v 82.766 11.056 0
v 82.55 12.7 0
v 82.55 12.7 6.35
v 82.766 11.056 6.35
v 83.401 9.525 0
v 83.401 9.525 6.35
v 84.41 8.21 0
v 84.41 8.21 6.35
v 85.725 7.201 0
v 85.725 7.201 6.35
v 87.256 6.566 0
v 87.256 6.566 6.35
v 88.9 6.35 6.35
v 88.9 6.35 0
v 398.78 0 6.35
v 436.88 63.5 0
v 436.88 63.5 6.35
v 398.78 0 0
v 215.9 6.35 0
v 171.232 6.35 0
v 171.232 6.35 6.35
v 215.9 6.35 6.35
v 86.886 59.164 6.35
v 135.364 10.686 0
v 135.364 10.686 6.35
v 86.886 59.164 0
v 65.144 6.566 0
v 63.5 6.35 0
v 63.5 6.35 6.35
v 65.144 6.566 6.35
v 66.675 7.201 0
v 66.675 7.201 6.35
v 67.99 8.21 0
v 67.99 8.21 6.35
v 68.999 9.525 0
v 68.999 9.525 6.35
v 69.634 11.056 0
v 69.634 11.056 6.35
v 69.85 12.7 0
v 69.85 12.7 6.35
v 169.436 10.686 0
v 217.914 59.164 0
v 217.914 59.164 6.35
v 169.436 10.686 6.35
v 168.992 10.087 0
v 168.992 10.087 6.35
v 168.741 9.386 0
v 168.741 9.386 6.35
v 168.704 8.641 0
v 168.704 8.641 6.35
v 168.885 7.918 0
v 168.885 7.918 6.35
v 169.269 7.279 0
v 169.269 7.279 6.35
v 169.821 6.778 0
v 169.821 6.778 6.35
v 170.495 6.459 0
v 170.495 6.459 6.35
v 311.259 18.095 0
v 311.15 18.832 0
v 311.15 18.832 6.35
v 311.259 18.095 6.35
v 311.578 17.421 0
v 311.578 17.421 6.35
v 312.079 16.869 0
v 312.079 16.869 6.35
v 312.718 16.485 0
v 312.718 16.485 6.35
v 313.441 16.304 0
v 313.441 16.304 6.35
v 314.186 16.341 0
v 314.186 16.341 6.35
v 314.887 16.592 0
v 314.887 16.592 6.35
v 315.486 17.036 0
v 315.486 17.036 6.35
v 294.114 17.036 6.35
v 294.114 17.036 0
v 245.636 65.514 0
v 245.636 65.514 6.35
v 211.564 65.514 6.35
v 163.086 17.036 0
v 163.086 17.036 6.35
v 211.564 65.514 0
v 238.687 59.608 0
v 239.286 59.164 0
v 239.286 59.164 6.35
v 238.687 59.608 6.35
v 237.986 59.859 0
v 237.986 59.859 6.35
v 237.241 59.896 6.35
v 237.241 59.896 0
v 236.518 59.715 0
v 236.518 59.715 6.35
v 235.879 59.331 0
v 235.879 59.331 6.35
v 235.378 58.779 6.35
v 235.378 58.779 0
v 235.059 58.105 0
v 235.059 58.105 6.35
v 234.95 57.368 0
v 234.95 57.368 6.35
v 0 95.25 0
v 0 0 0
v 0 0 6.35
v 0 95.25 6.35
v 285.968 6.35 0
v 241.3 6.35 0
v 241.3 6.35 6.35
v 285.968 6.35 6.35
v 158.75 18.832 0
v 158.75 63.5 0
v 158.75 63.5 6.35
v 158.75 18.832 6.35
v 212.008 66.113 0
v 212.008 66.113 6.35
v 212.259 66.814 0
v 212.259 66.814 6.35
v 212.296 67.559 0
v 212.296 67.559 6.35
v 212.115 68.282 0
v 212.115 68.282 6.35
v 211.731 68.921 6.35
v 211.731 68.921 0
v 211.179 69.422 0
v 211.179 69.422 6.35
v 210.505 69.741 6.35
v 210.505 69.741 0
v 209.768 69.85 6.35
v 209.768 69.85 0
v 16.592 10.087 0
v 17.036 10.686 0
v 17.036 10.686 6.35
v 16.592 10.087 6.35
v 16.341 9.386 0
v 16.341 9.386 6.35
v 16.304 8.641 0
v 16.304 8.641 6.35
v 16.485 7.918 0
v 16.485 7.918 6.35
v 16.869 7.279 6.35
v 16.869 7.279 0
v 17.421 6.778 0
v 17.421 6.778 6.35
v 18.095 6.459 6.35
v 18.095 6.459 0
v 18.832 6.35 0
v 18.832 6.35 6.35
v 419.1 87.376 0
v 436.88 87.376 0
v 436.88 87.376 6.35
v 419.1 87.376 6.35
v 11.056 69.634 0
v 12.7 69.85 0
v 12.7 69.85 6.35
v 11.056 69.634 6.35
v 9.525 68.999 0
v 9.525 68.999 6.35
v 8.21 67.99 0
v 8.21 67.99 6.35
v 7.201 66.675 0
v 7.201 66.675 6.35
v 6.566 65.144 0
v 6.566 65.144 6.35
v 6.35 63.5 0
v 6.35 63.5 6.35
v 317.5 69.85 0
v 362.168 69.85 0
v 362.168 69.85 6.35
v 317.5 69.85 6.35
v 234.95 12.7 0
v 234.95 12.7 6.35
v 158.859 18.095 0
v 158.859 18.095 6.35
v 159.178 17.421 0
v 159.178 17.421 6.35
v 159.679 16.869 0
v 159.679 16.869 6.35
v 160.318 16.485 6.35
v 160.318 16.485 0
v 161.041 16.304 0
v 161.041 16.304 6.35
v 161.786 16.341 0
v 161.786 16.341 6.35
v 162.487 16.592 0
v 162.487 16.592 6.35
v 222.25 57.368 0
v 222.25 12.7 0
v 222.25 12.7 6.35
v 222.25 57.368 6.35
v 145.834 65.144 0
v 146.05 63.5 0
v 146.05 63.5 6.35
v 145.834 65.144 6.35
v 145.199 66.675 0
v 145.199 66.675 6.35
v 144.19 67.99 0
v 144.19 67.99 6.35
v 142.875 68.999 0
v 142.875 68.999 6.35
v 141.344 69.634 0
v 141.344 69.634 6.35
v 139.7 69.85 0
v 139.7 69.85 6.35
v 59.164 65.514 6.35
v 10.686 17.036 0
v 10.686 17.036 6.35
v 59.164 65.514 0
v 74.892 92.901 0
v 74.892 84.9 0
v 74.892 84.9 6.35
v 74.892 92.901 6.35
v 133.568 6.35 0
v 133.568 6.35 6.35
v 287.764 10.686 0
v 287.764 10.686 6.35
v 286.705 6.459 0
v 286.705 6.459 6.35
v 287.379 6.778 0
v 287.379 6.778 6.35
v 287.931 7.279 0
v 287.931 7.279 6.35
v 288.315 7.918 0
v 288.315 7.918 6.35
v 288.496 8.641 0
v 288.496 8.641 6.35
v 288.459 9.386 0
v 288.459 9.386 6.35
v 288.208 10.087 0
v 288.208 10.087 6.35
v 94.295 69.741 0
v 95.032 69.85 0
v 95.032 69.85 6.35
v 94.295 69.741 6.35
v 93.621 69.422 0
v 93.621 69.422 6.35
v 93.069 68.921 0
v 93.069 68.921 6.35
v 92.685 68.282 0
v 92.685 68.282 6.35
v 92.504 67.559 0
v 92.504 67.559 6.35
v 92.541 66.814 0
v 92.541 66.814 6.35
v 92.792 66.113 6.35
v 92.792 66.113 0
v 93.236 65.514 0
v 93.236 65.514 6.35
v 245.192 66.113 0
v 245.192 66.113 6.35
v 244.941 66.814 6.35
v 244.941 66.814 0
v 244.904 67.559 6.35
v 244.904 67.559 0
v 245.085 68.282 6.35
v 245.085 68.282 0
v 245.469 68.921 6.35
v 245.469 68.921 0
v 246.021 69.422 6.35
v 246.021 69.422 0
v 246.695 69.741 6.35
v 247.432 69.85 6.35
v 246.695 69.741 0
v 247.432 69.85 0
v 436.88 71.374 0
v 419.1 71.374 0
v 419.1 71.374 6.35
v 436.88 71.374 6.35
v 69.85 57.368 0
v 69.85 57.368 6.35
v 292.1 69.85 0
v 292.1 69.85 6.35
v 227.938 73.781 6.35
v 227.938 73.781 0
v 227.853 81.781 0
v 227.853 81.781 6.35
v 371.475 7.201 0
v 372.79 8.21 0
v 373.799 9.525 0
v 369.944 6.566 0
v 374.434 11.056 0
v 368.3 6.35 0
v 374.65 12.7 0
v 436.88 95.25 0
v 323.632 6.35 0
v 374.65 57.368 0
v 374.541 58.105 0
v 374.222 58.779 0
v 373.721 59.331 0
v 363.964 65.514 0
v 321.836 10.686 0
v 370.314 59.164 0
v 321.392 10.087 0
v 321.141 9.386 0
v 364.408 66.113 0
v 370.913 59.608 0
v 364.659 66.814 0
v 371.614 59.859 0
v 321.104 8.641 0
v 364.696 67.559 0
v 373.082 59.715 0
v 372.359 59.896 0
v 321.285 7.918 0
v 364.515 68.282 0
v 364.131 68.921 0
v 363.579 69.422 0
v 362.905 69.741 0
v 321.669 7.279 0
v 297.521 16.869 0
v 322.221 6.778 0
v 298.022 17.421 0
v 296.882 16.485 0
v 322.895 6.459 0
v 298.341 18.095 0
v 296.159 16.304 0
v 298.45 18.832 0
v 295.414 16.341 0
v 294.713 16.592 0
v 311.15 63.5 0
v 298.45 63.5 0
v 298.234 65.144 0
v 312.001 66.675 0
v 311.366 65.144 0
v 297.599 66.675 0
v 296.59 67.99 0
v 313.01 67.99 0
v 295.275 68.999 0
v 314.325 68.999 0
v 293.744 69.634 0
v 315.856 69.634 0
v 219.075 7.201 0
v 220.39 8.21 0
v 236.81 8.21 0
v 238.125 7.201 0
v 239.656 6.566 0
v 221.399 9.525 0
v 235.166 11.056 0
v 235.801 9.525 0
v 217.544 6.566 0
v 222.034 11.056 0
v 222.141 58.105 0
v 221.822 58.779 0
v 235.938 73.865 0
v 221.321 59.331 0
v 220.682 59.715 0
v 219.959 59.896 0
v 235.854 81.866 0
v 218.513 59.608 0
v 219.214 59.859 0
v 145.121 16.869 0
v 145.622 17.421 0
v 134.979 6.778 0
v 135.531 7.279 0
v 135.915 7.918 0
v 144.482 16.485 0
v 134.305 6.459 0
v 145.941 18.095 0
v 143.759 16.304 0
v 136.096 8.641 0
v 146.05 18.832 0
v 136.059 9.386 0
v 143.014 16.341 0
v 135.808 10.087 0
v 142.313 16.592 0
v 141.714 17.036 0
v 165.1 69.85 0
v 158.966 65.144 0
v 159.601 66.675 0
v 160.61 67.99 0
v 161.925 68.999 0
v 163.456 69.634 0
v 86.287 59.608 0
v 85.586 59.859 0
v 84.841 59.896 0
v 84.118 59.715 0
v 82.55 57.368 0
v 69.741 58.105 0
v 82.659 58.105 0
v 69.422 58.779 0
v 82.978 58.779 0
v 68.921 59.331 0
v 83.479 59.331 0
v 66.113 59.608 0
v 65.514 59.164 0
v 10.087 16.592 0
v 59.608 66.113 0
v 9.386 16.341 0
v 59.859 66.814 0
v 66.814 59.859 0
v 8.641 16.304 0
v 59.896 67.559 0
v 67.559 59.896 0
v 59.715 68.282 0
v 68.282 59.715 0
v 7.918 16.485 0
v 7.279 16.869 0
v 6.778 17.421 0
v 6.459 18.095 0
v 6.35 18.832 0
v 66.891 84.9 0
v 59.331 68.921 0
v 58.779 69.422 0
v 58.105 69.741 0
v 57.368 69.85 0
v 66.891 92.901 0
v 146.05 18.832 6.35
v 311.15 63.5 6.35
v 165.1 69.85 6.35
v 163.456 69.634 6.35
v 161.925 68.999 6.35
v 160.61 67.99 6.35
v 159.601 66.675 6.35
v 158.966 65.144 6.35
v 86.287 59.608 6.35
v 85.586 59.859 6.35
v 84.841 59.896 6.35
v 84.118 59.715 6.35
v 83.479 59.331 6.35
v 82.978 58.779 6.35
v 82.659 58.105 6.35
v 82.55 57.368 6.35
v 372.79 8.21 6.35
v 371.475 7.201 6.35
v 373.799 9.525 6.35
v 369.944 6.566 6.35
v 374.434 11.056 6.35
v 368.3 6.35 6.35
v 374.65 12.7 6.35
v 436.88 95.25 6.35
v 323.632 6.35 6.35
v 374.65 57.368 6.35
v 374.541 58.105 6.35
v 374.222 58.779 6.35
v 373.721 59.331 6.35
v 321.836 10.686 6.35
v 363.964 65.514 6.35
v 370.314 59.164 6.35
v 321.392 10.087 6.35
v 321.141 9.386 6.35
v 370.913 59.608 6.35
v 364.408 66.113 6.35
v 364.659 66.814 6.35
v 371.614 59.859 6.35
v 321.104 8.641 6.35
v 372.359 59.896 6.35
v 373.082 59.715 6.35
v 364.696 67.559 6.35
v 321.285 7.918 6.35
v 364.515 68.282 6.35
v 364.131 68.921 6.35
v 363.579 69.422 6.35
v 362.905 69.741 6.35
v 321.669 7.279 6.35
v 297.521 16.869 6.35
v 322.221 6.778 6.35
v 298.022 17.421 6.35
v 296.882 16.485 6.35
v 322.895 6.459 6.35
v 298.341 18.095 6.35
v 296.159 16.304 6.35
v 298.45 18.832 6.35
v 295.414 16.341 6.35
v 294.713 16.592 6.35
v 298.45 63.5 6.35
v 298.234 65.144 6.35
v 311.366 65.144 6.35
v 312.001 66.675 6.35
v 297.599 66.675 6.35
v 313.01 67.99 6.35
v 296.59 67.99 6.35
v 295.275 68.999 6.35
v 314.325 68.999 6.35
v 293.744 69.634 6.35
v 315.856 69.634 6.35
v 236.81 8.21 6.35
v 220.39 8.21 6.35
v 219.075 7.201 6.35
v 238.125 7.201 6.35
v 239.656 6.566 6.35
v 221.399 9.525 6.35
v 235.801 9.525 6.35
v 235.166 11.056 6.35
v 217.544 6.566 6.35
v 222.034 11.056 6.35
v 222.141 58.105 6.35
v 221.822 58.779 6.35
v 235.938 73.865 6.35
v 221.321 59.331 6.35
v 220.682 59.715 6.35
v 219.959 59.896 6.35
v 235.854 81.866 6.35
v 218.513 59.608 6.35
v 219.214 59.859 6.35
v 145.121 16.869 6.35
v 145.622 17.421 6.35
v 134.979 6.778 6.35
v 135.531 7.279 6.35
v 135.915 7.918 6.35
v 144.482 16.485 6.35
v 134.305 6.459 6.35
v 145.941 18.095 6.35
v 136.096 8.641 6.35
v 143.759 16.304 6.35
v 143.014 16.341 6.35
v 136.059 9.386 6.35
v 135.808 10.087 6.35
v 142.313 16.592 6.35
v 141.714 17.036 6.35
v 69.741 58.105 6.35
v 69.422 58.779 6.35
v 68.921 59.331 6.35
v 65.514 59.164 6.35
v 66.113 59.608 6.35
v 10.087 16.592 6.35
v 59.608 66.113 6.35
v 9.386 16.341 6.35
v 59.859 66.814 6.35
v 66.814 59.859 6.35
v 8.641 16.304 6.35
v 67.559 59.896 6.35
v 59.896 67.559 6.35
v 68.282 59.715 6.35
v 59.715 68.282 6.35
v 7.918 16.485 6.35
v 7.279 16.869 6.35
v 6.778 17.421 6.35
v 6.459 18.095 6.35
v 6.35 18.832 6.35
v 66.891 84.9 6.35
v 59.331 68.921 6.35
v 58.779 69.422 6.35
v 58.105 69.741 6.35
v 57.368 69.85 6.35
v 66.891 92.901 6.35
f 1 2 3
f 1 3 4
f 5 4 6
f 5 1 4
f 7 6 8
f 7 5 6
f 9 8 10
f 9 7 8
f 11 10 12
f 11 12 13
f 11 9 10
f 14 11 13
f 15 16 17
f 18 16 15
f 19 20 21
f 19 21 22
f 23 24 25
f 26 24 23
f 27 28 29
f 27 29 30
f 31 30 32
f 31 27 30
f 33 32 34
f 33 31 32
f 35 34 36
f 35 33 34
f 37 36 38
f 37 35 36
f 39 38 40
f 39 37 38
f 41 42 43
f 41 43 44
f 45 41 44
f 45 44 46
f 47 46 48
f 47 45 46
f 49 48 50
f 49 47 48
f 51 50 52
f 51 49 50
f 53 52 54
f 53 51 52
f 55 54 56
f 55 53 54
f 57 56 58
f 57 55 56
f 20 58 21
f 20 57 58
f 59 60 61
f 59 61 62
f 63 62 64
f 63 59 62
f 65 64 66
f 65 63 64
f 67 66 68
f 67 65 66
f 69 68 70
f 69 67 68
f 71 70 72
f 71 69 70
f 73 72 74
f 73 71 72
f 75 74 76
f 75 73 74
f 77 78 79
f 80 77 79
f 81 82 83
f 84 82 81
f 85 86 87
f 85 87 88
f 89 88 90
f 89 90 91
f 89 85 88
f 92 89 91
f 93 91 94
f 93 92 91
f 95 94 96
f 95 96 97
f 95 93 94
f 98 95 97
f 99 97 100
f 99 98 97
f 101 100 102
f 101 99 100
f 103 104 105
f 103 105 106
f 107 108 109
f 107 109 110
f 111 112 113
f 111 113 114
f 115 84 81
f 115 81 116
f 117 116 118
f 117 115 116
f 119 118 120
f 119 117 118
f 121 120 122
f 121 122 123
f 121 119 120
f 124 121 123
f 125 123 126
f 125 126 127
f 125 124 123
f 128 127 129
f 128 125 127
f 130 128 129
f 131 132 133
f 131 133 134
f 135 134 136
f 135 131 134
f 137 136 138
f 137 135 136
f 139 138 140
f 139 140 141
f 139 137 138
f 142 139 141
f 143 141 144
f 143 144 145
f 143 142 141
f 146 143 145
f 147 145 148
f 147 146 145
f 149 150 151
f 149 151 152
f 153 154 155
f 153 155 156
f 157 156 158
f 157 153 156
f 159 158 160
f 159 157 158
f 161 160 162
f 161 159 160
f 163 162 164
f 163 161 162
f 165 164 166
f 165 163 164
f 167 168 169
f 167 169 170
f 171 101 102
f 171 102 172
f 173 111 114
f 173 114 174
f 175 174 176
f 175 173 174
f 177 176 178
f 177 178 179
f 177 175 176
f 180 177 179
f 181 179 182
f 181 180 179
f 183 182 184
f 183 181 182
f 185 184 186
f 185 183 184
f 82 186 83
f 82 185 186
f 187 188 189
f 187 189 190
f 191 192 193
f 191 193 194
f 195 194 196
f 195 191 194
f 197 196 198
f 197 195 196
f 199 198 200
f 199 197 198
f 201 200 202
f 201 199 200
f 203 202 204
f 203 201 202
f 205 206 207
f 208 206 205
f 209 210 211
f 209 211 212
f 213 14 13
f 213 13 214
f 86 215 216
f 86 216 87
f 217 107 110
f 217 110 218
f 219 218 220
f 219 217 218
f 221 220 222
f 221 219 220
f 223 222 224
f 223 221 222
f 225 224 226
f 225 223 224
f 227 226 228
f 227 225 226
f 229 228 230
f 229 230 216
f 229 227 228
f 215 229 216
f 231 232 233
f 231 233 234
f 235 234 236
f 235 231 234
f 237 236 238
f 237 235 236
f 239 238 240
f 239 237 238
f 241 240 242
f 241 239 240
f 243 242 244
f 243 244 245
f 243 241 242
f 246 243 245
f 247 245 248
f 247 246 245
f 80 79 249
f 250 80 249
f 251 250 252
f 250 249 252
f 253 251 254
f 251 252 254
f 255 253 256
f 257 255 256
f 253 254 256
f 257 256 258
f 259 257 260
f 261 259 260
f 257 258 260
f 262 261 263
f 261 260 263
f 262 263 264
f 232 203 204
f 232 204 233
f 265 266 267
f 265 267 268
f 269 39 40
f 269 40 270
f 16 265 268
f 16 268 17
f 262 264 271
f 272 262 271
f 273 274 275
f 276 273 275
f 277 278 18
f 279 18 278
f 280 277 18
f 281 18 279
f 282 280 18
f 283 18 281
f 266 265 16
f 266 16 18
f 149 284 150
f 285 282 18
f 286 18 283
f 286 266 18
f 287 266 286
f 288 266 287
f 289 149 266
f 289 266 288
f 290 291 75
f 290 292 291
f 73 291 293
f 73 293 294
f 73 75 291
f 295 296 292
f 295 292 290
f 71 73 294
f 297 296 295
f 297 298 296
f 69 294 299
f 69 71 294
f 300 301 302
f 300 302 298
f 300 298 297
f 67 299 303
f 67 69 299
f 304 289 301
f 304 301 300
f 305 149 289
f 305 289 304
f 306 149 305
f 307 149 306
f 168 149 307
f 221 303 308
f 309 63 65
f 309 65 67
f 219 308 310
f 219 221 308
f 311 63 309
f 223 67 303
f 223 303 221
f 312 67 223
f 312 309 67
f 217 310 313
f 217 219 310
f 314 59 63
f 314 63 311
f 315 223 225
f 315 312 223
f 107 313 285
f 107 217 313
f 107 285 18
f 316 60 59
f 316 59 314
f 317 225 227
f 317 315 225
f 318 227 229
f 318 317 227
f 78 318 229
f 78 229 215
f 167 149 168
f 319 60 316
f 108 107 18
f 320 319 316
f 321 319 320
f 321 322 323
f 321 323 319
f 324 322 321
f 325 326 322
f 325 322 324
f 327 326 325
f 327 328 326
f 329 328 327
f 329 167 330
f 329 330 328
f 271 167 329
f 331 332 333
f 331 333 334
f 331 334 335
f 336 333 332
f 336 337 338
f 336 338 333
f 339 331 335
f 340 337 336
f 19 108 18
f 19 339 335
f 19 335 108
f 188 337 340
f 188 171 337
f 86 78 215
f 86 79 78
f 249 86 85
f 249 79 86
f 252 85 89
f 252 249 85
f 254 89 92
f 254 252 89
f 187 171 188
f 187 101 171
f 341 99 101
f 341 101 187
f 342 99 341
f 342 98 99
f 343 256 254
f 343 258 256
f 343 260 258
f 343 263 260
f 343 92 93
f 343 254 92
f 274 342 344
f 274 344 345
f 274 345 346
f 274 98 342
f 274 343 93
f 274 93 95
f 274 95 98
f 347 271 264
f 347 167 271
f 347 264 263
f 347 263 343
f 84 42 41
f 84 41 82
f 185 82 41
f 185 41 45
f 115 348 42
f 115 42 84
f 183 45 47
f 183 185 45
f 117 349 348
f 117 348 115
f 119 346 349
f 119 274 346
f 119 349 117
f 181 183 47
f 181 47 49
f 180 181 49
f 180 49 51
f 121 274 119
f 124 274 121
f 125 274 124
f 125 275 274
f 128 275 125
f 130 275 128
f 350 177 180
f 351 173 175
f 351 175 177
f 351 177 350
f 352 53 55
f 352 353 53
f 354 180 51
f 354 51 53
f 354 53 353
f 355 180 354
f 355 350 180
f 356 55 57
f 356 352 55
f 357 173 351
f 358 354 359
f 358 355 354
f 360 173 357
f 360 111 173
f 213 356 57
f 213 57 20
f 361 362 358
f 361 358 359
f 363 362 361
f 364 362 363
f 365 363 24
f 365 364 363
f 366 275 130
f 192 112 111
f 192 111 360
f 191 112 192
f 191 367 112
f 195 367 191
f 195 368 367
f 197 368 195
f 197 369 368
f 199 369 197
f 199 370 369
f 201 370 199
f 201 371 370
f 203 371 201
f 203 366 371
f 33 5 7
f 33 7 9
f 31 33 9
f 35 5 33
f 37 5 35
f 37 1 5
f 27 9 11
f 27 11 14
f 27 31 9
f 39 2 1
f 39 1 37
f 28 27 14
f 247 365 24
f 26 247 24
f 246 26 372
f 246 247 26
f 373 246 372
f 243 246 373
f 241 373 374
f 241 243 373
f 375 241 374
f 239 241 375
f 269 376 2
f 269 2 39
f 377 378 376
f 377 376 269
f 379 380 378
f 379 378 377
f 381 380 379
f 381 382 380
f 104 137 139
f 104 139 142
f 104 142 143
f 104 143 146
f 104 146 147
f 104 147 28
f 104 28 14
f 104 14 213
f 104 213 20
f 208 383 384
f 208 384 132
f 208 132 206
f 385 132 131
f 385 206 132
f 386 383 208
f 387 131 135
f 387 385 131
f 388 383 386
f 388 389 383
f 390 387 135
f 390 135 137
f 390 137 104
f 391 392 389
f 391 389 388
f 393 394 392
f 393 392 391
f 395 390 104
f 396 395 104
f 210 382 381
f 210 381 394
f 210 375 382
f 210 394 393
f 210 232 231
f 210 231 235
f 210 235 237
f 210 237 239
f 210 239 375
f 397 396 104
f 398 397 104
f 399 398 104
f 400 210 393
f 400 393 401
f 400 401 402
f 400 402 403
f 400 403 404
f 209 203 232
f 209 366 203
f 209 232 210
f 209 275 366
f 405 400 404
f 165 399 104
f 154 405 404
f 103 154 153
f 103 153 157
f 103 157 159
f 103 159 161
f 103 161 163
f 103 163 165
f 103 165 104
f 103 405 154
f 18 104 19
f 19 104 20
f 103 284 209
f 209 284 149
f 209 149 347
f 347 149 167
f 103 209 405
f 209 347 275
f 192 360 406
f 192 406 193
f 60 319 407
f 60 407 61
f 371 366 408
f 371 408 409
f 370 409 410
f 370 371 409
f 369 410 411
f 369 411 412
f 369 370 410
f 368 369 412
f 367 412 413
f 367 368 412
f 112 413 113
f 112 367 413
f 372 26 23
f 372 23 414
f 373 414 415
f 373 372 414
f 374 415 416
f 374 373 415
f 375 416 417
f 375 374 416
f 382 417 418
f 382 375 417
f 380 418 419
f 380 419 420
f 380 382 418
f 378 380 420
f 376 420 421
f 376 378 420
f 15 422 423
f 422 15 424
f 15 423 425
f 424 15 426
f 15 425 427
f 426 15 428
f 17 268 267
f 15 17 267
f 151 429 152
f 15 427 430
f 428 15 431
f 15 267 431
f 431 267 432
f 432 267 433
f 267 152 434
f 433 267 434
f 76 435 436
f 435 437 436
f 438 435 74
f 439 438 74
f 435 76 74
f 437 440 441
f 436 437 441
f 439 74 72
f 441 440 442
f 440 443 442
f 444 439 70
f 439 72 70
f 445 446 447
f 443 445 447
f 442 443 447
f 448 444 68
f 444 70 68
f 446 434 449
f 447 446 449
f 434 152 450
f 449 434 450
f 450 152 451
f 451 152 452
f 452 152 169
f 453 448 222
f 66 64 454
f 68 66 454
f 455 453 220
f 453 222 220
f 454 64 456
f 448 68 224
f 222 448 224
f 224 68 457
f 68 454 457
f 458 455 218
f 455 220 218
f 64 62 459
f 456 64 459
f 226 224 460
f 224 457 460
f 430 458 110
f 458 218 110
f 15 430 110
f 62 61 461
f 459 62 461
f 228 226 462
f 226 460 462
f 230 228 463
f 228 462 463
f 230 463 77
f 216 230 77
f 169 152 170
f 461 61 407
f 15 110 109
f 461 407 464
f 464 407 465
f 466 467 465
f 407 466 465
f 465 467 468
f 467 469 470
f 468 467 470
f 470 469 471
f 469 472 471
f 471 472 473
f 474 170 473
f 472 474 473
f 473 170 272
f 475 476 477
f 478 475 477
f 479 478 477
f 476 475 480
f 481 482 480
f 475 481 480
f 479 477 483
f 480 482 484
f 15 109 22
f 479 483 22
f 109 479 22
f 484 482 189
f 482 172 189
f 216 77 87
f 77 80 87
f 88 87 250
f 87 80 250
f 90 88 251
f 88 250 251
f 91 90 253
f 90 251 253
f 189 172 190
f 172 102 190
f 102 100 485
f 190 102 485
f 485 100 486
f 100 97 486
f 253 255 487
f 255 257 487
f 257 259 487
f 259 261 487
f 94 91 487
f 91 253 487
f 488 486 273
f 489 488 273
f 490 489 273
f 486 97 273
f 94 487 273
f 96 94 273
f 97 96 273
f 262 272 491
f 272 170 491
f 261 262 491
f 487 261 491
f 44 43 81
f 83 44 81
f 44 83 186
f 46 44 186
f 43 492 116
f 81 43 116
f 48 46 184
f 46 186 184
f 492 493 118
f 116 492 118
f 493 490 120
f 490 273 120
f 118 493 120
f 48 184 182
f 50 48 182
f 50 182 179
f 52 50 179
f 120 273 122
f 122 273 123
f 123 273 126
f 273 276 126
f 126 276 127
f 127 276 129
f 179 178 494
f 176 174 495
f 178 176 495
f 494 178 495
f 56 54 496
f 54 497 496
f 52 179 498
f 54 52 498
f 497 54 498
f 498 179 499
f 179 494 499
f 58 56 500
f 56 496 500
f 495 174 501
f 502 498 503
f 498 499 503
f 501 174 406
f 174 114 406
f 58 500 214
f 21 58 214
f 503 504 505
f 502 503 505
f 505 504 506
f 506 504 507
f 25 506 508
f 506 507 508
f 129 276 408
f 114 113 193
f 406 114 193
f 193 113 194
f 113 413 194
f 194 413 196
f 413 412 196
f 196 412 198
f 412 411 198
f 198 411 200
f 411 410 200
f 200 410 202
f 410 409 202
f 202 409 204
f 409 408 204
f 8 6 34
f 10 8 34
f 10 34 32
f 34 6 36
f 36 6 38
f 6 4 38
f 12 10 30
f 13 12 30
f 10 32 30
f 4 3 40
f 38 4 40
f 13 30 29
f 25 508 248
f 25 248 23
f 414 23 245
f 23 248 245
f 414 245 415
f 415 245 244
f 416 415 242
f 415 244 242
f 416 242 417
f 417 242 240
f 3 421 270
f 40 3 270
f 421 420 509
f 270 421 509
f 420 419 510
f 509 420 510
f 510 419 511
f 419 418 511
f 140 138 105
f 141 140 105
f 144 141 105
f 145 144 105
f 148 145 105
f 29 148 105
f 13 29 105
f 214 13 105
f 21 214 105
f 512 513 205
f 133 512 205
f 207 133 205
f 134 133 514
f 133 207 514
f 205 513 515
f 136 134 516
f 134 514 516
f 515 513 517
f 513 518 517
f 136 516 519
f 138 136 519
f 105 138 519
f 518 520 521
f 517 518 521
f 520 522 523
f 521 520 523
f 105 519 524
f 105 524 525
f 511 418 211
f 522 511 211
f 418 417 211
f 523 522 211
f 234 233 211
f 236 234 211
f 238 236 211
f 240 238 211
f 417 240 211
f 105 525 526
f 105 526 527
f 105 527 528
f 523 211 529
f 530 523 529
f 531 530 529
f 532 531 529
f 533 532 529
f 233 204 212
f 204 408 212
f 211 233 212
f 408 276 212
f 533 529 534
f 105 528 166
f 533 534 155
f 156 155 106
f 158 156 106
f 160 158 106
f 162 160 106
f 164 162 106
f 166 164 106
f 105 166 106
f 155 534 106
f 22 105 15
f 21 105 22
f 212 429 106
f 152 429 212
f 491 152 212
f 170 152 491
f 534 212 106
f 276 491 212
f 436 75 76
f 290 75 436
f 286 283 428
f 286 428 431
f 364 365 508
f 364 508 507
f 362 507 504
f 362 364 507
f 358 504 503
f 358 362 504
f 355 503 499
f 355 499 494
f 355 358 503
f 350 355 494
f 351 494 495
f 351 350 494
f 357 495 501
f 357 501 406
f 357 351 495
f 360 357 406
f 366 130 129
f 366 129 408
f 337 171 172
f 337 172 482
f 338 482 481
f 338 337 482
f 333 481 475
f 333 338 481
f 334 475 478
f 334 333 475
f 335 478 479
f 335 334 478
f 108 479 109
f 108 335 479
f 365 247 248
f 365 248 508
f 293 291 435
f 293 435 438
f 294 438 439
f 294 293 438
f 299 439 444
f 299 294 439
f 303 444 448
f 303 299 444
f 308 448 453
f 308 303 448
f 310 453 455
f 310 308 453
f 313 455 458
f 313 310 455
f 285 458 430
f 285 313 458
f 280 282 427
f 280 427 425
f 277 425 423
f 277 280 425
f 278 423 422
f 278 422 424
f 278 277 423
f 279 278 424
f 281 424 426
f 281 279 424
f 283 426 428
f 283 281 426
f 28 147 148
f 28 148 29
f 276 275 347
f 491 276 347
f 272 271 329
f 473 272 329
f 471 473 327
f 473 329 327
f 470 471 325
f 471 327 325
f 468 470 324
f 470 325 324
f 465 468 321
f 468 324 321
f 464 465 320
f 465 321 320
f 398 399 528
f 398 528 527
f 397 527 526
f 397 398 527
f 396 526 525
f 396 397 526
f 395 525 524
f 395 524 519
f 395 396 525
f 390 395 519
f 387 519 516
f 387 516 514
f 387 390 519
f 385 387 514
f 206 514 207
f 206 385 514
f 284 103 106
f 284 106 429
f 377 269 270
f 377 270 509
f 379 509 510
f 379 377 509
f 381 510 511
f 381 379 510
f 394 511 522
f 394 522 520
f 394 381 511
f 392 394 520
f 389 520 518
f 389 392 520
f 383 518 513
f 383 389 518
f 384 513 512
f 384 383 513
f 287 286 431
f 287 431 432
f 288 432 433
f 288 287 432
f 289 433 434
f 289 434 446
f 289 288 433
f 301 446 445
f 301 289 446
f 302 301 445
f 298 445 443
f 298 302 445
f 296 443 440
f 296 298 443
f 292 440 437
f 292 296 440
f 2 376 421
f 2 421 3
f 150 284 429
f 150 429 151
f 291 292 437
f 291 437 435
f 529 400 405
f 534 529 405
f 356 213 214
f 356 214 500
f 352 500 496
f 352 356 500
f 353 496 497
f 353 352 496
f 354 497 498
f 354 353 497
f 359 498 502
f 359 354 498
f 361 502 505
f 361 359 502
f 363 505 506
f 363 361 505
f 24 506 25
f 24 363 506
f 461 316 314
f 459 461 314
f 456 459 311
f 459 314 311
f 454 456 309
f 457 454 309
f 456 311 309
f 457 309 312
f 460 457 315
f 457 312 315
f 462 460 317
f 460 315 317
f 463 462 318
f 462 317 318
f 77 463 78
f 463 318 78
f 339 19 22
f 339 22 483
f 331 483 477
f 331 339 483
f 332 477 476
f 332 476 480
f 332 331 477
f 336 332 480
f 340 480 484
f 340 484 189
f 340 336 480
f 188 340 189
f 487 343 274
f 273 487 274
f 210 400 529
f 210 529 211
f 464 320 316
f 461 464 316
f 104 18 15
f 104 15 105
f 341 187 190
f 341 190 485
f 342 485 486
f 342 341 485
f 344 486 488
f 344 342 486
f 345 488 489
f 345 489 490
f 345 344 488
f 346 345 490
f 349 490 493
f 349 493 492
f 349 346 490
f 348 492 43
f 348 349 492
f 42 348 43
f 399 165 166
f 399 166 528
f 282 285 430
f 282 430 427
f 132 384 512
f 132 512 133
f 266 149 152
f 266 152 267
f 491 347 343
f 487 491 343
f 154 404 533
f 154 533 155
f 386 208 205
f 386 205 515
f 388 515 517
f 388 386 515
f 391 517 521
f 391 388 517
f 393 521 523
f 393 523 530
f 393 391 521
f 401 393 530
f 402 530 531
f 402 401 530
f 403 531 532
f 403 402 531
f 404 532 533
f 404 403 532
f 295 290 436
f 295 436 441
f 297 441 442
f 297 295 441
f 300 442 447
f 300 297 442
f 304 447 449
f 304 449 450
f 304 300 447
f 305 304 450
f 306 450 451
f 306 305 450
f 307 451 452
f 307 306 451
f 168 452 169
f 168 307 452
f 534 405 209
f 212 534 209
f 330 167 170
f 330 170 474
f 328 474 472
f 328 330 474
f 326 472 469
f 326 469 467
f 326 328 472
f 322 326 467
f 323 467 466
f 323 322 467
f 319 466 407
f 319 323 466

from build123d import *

# Parameters (mm, degrees)
MODEL_W             = 8.001
MODEL_H             = 8.001
BOSS_EXTRUDE2_DEPTH = 6.35


with BuildPart() as part:
    # Model → Boss-Extrude2 (new body)
    with BuildSketch(Plane.XY):
        Polygon((419.1, 87.376), (419.1, 71.374), (436.88, 71.374), (436.88, 63.5), (398.78, 0), (0, 0), (0, 95.25), (436.88, 95.25), (436.88, 87.376), align=None)
        with Locations((70.891200524, 88.9)):
            Rectangle(MODEL_W, MODEL_H, mode=Mode.SUBTRACT)
        Polygon((235.853706977, 81.865965064), (235.938184476, 73.865411048), (227.937630461, 73.780933549), (227.853152962, 81.781487564), align=None, mode=Mode.SUBTRACT)
        with BuildLine():
            Line((171.232102448, 6.35), (215.9, 6.35))
            ThreePointArc((215.9, 6.35), (220.390128061, 8.209871939), (222.25, 12.7))
            Line((222.25, 12.7), (222.25, 57.367897552))
            ThreePointArc((222.25, 57.367897552), (220.682015918, 59.714551565), (217.913948776, 59.163948776))
            Line((217.913948776, 59.163948776), (169.436051224, 10.686051224))
            ThreePointArc((169.436051224, 10.686051224), (168.885448435, 7.917984082), (171.232102448, 6.35))
        make_face(mode=Mode.SUBTRACT)
        with BuildLine():
            Line((234.95, 57.367897552), (234.95, 12.7))
            ThreePointArc((234.95, 12.7), (236.809871939, 8.209871939), (241.3, 6.35))
            Line((241.3, 6.35), (285.967897552, 6.35))
            ThreePointArc((285.967897552, 6.35), (288.314551565, 7.917984082), (287.763948776, 10.686051224))
            Line((287.763948776, 10.686051224), (239.286051224, 59.163948776))
            ThreePointArc((239.286051224, 59.163948776), (236.517984082, 59.714551565), (234.95, 57.367897552))
        make_face(mode=Mode.SUBTRACT)
        with BuildLine():
            Line((294.113948776, 17.036051224), (245.636051224, 65.513948776))
            ThreePointArc((245.636051224, 65.513948776), (245.085448435, 68.282015918), (247.432102448, 69.85))
            Line((247.432102448, 69.85), (292.1, 69.85))
            ThreePointArc((292.1, 69.85), (296.590128061, 67.990128061), (298.45, 63.5))
            Line((298.45, 63.5), (298.45, 18.832102448))
            ThreePointArc((298.45, 18.832102448), (296.882015918, 16.485448435), (294.113948776, 17.036051224))
        make_face(mode=Mode.SUBTRACT)
        with BuildLine():
            Line((323.632102448, 6.35), (368.3, 6.35))
            ThreePointArc((368.3, 6.35), (372.790128061, 8.209871939), (374.65, 12.7))
            Line((374.65, 12.7), (374.65, 57.367897552))
            ThreePointArc((374.65, 57.367897552), (373.082015918, 59.714551565), (370.313948776, 59.163948776))
            Line((370.313948776, 59.163948776), (321.836051224, 10.686051224))
            ThreePointArc((321.836051224, 10.686051224), (321.285448435, 7.917984082), (323.632102448, 6.35))
        make_face(mode=Mode.SUBTRACT)
        with BuildLine():
            Line((18.832102448, 6.35), (63.5, 6.35))
            ThreePointArc((63.5, 6.35), (67.990128061, 8.209871939), (69.85, 12.7))
            Line((69.85, 12.7), (69.85, 57.367897552))
            ThreePointArc((69.85, 57.367897552), (68.282015918, 59.714551565), (65.513948776, 59.163948776))
            Line((65.513948776, 59.163948776), (17.036051224, 10.686051224))
            ThreePointArc((17.036051224, 10.686051224), (16.485448435, 7.917984082), (18.832102448, 6.35))
        make_face(mode=Mode.SUBTRACT)
        with BuildLine():
            Line((82.55, 57.367897552), (82.55, 12.7))
            ThreePointArc((82.55, 12.7), (84.409871939, 8.209871939), (88.9, 6.35))
            Line((88.9, 6.35), (133.567897552, 6.35))
            ThreePointArc((133.567897552, 6.35), (135.914551565, 7.917984082), (135.363948776, 10.686051224))
            Line((135.363948776, 10.686051224), (86.886051224, 59.163948776))
            ThreePointArc((86.886051224, 59.163948776), (84.117984082, 59.714551565), (82.55, 57.367897552))
        make_face(mode=Mode.SUBTRACT)
        with BuildLine():
            Line((93.236051224, 65.513948776), (141.713948776, 17.036051224))
            ThreePointArc((141.713948776, 17.036051224), (144.482015918, 16.485448435), (146.05, 18.832102448))
            Line((146.05, 18.832102448), (146.05, 63.5))
            ThreePointArc((146.05, 63.5), (144.190128061, 67.990128061), (139.7, 69.85))
            Line((139.7, 69.85), (95.032102448, 69.85))
            ThreePointArc((95.032102448, 69.85), (92.685448435, 68.282015918), (93.236051224, 65.513948776))
        make_face(mode=Mode.SUBTRACT)
        with BuildLine():
            Line((163.086051224, 17.036051224), (211.563948776, 65.513948776))
            ThreePointArc((211.563948776, 65.513948776), (212.114551565, 68.282015918), (209.767897552, 69.85))
            Line((209.767897552, 69.85), (165.1, 69.85))
            ThreePointArc((165.1, 69.85), (160.609871939, 67.990128061), (158.75, 63.5))
            Line((158.75, 63.5), (158.75, 18.832102448))
            ThreePointArc((158.75, 18.832102448), (160.317984082, 16.485448435), (163.086051224, 17.036051224))
        make_face(mode=Mode.SUBTRACT)
        with BuildLine():
            Line((315.486051224, 17.036051224), (363.963948776, 65.513948776))
            ThreePointArc((363.963948776, 65.513948776), (364.514551565, 68.282015918), (362.167897552, 69.85))
            Line((362.167897552, 69.85), (317.5, 69.85))
            ThreePointArc((317.5, 69.85), (313.009871939, 67.990128061), (311.15, 63.5))
            Line((311.15, 63.5), (311.15, 18.832102448))
            ThreePointArc((311.15, 18.832102448), (312.717984082, 16.485448435), (315.486051224, 17.036051224))
        make_face(mode=Mode.SUBTRACT)
        with BuildLine():
            Line((6.35, 63.5), (6.35, 18.832102448))
            ThreePointArc((6.35, 18.832102448), (7.917984082, 16.485448435), (10.686051224, 17.036051224))
            Line((10.686051224, 17.036051224), (59.163948776, 65.513948776))
            ThreePointArc((59.163948776, 65.513948776), (59.714551565, 68.282015918), (57.367897552, 69.85))
            Line((57.367897552, 69.85), (12.7, 69.85))
            ThreePointArc((12.7, 69.85), (8.209871939, 67.990128061), (6.35, 63.5))
        make_face(mode=Mode.SUBTRACT)
    extrude(amount=BOSS_EXTRUDE2_DEPTH)


solid = part.part
